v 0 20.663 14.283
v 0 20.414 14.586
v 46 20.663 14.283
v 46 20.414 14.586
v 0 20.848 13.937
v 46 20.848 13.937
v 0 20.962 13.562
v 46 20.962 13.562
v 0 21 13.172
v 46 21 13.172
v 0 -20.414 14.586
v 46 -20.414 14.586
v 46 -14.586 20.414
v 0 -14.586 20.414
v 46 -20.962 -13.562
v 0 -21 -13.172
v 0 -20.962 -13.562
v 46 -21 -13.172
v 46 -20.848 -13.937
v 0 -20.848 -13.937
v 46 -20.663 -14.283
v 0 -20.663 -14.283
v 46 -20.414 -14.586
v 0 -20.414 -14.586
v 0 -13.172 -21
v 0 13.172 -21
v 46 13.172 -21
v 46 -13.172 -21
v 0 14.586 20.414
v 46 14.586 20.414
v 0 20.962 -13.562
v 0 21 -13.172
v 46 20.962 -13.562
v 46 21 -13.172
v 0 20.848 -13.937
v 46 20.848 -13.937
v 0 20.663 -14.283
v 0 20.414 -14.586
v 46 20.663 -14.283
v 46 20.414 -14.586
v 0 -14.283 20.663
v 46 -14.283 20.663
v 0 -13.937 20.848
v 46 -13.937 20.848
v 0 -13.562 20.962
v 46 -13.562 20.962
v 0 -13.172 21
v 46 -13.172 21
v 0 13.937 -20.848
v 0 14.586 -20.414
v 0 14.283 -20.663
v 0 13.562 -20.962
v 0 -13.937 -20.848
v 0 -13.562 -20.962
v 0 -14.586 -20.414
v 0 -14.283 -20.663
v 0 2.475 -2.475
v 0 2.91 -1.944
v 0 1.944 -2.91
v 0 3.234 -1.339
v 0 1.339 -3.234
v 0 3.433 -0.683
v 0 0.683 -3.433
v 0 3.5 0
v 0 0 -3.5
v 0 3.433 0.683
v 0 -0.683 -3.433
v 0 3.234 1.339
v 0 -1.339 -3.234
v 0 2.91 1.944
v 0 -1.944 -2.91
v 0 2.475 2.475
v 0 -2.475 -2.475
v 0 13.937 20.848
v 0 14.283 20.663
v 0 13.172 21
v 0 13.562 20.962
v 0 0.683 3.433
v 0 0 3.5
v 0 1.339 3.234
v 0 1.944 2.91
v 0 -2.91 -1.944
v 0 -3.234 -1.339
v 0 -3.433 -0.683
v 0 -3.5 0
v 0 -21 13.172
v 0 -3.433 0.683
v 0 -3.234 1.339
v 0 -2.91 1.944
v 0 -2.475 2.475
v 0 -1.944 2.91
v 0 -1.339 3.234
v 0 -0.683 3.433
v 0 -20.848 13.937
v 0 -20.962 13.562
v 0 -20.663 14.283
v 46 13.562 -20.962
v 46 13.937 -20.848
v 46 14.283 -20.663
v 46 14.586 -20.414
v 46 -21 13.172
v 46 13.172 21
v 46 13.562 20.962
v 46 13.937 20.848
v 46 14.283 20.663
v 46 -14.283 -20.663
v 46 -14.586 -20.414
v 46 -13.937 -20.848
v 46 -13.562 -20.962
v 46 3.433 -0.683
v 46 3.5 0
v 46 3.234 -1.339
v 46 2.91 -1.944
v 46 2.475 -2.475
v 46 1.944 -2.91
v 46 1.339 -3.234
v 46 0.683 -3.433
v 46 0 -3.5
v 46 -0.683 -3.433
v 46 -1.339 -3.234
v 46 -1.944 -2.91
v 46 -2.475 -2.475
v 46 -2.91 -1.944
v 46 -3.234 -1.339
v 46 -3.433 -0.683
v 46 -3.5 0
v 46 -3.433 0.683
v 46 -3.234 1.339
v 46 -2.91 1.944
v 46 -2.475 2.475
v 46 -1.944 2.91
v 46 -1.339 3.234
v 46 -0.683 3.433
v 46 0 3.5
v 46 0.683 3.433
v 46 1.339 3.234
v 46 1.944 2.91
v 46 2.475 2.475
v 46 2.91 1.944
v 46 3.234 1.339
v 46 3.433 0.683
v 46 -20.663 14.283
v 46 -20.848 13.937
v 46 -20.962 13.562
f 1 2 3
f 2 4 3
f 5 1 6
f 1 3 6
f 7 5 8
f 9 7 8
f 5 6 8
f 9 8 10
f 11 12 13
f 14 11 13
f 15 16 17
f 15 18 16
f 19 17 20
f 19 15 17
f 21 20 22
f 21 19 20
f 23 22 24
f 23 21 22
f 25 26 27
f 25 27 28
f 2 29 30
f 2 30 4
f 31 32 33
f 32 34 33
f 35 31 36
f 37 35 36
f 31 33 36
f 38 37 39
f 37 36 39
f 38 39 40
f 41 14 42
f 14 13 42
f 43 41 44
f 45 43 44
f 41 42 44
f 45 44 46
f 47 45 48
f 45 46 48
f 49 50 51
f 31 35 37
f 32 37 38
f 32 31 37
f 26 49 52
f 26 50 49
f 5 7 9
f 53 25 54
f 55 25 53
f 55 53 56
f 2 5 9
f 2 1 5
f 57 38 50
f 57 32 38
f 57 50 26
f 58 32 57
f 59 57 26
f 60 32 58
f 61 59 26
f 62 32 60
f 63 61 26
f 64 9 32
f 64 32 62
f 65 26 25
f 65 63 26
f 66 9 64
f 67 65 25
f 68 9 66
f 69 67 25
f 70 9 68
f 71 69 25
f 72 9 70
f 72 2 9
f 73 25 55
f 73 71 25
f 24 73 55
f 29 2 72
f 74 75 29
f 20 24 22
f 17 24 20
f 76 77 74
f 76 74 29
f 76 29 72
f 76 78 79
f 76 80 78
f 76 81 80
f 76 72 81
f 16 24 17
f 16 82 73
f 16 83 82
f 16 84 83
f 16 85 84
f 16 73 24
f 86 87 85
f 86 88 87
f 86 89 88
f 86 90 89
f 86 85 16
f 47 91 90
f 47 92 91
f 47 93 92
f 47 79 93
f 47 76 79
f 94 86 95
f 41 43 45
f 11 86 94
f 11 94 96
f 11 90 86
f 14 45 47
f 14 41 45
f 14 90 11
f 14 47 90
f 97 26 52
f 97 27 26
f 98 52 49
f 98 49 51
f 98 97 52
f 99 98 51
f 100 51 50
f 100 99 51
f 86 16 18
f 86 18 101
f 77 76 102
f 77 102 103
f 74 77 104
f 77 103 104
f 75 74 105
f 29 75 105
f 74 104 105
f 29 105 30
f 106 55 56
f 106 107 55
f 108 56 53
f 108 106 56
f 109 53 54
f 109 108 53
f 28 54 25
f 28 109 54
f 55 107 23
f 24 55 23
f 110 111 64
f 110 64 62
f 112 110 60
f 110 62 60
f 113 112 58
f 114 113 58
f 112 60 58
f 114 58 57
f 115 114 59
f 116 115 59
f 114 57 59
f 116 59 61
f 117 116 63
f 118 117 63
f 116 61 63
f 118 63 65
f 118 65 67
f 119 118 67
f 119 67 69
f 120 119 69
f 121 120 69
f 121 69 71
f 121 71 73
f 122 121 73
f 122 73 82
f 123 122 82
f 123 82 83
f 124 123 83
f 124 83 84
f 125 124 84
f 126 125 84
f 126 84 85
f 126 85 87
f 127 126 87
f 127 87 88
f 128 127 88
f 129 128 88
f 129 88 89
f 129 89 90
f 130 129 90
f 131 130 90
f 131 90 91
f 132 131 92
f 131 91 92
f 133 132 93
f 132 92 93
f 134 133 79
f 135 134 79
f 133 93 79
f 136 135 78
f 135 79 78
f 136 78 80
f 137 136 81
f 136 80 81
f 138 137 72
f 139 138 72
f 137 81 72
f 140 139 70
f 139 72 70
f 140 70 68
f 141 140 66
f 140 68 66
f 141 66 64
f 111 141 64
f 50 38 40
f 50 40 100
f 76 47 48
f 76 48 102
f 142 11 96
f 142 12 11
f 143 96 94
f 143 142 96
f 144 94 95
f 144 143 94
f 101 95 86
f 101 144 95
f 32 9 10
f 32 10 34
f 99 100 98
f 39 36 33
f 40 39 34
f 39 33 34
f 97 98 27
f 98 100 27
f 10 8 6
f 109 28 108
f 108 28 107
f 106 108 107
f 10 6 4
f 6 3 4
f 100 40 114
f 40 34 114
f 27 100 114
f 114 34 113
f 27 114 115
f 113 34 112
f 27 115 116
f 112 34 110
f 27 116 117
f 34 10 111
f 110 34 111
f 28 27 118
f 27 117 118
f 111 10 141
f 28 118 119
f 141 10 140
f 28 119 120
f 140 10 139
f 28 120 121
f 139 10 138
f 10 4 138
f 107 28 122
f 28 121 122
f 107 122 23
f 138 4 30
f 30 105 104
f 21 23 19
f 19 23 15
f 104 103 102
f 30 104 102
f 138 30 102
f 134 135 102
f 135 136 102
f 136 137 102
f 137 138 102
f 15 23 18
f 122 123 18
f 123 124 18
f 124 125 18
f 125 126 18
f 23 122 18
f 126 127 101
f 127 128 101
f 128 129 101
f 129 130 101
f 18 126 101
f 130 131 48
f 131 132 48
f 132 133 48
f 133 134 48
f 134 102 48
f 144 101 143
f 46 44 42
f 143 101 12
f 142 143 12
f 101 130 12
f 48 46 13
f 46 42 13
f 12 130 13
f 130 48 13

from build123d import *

# Parameters (mm, degrees)
PAD_DEPTH       = 46
SKETCH003_R     = 3.5
POCKET001_DEPTH = 46.001
FILLET003_R     = 2


with BuildPart() as part:
    # Sketch002 → Pad (new body)
    with BuildSketch(Plane.YZ):
        Polygon((-21, 14), (-14, 21), (14, 21), (21, 14), (21, -14), (14, -21), (-14, -21), (-21, -14), align=None)
    extrude(amount=PAD_DEPTH)

    # Sketch003 (on Face9 of Pad) → Pocket001 (cut, through all)
    with BuildSketch(Plane(origin=(0, 0, 0), x_dir=(0, 1, 0), z_dir=(-1, 0, 0))):
        Circle(SKETCH003_R)
    extrude(amount=-POCKET001_DEPTH, mode=Mode.SUBTRACT)

    # Fillet003
    fillet003_edges = [part.edges().sort_by_distance(p)[0] for p in [
        (23, -21, -14),
        (23, -21, 14),
        (23, -14, 21),
        (23, 14, 21),
        (23, -14, -21),
        (23, 14, -21),
        (23, 21, -14),
        (23, 21, 14),
    ]]
    fillet(fillet003_edges, radius=FILLET003_R)


solid = part.part
